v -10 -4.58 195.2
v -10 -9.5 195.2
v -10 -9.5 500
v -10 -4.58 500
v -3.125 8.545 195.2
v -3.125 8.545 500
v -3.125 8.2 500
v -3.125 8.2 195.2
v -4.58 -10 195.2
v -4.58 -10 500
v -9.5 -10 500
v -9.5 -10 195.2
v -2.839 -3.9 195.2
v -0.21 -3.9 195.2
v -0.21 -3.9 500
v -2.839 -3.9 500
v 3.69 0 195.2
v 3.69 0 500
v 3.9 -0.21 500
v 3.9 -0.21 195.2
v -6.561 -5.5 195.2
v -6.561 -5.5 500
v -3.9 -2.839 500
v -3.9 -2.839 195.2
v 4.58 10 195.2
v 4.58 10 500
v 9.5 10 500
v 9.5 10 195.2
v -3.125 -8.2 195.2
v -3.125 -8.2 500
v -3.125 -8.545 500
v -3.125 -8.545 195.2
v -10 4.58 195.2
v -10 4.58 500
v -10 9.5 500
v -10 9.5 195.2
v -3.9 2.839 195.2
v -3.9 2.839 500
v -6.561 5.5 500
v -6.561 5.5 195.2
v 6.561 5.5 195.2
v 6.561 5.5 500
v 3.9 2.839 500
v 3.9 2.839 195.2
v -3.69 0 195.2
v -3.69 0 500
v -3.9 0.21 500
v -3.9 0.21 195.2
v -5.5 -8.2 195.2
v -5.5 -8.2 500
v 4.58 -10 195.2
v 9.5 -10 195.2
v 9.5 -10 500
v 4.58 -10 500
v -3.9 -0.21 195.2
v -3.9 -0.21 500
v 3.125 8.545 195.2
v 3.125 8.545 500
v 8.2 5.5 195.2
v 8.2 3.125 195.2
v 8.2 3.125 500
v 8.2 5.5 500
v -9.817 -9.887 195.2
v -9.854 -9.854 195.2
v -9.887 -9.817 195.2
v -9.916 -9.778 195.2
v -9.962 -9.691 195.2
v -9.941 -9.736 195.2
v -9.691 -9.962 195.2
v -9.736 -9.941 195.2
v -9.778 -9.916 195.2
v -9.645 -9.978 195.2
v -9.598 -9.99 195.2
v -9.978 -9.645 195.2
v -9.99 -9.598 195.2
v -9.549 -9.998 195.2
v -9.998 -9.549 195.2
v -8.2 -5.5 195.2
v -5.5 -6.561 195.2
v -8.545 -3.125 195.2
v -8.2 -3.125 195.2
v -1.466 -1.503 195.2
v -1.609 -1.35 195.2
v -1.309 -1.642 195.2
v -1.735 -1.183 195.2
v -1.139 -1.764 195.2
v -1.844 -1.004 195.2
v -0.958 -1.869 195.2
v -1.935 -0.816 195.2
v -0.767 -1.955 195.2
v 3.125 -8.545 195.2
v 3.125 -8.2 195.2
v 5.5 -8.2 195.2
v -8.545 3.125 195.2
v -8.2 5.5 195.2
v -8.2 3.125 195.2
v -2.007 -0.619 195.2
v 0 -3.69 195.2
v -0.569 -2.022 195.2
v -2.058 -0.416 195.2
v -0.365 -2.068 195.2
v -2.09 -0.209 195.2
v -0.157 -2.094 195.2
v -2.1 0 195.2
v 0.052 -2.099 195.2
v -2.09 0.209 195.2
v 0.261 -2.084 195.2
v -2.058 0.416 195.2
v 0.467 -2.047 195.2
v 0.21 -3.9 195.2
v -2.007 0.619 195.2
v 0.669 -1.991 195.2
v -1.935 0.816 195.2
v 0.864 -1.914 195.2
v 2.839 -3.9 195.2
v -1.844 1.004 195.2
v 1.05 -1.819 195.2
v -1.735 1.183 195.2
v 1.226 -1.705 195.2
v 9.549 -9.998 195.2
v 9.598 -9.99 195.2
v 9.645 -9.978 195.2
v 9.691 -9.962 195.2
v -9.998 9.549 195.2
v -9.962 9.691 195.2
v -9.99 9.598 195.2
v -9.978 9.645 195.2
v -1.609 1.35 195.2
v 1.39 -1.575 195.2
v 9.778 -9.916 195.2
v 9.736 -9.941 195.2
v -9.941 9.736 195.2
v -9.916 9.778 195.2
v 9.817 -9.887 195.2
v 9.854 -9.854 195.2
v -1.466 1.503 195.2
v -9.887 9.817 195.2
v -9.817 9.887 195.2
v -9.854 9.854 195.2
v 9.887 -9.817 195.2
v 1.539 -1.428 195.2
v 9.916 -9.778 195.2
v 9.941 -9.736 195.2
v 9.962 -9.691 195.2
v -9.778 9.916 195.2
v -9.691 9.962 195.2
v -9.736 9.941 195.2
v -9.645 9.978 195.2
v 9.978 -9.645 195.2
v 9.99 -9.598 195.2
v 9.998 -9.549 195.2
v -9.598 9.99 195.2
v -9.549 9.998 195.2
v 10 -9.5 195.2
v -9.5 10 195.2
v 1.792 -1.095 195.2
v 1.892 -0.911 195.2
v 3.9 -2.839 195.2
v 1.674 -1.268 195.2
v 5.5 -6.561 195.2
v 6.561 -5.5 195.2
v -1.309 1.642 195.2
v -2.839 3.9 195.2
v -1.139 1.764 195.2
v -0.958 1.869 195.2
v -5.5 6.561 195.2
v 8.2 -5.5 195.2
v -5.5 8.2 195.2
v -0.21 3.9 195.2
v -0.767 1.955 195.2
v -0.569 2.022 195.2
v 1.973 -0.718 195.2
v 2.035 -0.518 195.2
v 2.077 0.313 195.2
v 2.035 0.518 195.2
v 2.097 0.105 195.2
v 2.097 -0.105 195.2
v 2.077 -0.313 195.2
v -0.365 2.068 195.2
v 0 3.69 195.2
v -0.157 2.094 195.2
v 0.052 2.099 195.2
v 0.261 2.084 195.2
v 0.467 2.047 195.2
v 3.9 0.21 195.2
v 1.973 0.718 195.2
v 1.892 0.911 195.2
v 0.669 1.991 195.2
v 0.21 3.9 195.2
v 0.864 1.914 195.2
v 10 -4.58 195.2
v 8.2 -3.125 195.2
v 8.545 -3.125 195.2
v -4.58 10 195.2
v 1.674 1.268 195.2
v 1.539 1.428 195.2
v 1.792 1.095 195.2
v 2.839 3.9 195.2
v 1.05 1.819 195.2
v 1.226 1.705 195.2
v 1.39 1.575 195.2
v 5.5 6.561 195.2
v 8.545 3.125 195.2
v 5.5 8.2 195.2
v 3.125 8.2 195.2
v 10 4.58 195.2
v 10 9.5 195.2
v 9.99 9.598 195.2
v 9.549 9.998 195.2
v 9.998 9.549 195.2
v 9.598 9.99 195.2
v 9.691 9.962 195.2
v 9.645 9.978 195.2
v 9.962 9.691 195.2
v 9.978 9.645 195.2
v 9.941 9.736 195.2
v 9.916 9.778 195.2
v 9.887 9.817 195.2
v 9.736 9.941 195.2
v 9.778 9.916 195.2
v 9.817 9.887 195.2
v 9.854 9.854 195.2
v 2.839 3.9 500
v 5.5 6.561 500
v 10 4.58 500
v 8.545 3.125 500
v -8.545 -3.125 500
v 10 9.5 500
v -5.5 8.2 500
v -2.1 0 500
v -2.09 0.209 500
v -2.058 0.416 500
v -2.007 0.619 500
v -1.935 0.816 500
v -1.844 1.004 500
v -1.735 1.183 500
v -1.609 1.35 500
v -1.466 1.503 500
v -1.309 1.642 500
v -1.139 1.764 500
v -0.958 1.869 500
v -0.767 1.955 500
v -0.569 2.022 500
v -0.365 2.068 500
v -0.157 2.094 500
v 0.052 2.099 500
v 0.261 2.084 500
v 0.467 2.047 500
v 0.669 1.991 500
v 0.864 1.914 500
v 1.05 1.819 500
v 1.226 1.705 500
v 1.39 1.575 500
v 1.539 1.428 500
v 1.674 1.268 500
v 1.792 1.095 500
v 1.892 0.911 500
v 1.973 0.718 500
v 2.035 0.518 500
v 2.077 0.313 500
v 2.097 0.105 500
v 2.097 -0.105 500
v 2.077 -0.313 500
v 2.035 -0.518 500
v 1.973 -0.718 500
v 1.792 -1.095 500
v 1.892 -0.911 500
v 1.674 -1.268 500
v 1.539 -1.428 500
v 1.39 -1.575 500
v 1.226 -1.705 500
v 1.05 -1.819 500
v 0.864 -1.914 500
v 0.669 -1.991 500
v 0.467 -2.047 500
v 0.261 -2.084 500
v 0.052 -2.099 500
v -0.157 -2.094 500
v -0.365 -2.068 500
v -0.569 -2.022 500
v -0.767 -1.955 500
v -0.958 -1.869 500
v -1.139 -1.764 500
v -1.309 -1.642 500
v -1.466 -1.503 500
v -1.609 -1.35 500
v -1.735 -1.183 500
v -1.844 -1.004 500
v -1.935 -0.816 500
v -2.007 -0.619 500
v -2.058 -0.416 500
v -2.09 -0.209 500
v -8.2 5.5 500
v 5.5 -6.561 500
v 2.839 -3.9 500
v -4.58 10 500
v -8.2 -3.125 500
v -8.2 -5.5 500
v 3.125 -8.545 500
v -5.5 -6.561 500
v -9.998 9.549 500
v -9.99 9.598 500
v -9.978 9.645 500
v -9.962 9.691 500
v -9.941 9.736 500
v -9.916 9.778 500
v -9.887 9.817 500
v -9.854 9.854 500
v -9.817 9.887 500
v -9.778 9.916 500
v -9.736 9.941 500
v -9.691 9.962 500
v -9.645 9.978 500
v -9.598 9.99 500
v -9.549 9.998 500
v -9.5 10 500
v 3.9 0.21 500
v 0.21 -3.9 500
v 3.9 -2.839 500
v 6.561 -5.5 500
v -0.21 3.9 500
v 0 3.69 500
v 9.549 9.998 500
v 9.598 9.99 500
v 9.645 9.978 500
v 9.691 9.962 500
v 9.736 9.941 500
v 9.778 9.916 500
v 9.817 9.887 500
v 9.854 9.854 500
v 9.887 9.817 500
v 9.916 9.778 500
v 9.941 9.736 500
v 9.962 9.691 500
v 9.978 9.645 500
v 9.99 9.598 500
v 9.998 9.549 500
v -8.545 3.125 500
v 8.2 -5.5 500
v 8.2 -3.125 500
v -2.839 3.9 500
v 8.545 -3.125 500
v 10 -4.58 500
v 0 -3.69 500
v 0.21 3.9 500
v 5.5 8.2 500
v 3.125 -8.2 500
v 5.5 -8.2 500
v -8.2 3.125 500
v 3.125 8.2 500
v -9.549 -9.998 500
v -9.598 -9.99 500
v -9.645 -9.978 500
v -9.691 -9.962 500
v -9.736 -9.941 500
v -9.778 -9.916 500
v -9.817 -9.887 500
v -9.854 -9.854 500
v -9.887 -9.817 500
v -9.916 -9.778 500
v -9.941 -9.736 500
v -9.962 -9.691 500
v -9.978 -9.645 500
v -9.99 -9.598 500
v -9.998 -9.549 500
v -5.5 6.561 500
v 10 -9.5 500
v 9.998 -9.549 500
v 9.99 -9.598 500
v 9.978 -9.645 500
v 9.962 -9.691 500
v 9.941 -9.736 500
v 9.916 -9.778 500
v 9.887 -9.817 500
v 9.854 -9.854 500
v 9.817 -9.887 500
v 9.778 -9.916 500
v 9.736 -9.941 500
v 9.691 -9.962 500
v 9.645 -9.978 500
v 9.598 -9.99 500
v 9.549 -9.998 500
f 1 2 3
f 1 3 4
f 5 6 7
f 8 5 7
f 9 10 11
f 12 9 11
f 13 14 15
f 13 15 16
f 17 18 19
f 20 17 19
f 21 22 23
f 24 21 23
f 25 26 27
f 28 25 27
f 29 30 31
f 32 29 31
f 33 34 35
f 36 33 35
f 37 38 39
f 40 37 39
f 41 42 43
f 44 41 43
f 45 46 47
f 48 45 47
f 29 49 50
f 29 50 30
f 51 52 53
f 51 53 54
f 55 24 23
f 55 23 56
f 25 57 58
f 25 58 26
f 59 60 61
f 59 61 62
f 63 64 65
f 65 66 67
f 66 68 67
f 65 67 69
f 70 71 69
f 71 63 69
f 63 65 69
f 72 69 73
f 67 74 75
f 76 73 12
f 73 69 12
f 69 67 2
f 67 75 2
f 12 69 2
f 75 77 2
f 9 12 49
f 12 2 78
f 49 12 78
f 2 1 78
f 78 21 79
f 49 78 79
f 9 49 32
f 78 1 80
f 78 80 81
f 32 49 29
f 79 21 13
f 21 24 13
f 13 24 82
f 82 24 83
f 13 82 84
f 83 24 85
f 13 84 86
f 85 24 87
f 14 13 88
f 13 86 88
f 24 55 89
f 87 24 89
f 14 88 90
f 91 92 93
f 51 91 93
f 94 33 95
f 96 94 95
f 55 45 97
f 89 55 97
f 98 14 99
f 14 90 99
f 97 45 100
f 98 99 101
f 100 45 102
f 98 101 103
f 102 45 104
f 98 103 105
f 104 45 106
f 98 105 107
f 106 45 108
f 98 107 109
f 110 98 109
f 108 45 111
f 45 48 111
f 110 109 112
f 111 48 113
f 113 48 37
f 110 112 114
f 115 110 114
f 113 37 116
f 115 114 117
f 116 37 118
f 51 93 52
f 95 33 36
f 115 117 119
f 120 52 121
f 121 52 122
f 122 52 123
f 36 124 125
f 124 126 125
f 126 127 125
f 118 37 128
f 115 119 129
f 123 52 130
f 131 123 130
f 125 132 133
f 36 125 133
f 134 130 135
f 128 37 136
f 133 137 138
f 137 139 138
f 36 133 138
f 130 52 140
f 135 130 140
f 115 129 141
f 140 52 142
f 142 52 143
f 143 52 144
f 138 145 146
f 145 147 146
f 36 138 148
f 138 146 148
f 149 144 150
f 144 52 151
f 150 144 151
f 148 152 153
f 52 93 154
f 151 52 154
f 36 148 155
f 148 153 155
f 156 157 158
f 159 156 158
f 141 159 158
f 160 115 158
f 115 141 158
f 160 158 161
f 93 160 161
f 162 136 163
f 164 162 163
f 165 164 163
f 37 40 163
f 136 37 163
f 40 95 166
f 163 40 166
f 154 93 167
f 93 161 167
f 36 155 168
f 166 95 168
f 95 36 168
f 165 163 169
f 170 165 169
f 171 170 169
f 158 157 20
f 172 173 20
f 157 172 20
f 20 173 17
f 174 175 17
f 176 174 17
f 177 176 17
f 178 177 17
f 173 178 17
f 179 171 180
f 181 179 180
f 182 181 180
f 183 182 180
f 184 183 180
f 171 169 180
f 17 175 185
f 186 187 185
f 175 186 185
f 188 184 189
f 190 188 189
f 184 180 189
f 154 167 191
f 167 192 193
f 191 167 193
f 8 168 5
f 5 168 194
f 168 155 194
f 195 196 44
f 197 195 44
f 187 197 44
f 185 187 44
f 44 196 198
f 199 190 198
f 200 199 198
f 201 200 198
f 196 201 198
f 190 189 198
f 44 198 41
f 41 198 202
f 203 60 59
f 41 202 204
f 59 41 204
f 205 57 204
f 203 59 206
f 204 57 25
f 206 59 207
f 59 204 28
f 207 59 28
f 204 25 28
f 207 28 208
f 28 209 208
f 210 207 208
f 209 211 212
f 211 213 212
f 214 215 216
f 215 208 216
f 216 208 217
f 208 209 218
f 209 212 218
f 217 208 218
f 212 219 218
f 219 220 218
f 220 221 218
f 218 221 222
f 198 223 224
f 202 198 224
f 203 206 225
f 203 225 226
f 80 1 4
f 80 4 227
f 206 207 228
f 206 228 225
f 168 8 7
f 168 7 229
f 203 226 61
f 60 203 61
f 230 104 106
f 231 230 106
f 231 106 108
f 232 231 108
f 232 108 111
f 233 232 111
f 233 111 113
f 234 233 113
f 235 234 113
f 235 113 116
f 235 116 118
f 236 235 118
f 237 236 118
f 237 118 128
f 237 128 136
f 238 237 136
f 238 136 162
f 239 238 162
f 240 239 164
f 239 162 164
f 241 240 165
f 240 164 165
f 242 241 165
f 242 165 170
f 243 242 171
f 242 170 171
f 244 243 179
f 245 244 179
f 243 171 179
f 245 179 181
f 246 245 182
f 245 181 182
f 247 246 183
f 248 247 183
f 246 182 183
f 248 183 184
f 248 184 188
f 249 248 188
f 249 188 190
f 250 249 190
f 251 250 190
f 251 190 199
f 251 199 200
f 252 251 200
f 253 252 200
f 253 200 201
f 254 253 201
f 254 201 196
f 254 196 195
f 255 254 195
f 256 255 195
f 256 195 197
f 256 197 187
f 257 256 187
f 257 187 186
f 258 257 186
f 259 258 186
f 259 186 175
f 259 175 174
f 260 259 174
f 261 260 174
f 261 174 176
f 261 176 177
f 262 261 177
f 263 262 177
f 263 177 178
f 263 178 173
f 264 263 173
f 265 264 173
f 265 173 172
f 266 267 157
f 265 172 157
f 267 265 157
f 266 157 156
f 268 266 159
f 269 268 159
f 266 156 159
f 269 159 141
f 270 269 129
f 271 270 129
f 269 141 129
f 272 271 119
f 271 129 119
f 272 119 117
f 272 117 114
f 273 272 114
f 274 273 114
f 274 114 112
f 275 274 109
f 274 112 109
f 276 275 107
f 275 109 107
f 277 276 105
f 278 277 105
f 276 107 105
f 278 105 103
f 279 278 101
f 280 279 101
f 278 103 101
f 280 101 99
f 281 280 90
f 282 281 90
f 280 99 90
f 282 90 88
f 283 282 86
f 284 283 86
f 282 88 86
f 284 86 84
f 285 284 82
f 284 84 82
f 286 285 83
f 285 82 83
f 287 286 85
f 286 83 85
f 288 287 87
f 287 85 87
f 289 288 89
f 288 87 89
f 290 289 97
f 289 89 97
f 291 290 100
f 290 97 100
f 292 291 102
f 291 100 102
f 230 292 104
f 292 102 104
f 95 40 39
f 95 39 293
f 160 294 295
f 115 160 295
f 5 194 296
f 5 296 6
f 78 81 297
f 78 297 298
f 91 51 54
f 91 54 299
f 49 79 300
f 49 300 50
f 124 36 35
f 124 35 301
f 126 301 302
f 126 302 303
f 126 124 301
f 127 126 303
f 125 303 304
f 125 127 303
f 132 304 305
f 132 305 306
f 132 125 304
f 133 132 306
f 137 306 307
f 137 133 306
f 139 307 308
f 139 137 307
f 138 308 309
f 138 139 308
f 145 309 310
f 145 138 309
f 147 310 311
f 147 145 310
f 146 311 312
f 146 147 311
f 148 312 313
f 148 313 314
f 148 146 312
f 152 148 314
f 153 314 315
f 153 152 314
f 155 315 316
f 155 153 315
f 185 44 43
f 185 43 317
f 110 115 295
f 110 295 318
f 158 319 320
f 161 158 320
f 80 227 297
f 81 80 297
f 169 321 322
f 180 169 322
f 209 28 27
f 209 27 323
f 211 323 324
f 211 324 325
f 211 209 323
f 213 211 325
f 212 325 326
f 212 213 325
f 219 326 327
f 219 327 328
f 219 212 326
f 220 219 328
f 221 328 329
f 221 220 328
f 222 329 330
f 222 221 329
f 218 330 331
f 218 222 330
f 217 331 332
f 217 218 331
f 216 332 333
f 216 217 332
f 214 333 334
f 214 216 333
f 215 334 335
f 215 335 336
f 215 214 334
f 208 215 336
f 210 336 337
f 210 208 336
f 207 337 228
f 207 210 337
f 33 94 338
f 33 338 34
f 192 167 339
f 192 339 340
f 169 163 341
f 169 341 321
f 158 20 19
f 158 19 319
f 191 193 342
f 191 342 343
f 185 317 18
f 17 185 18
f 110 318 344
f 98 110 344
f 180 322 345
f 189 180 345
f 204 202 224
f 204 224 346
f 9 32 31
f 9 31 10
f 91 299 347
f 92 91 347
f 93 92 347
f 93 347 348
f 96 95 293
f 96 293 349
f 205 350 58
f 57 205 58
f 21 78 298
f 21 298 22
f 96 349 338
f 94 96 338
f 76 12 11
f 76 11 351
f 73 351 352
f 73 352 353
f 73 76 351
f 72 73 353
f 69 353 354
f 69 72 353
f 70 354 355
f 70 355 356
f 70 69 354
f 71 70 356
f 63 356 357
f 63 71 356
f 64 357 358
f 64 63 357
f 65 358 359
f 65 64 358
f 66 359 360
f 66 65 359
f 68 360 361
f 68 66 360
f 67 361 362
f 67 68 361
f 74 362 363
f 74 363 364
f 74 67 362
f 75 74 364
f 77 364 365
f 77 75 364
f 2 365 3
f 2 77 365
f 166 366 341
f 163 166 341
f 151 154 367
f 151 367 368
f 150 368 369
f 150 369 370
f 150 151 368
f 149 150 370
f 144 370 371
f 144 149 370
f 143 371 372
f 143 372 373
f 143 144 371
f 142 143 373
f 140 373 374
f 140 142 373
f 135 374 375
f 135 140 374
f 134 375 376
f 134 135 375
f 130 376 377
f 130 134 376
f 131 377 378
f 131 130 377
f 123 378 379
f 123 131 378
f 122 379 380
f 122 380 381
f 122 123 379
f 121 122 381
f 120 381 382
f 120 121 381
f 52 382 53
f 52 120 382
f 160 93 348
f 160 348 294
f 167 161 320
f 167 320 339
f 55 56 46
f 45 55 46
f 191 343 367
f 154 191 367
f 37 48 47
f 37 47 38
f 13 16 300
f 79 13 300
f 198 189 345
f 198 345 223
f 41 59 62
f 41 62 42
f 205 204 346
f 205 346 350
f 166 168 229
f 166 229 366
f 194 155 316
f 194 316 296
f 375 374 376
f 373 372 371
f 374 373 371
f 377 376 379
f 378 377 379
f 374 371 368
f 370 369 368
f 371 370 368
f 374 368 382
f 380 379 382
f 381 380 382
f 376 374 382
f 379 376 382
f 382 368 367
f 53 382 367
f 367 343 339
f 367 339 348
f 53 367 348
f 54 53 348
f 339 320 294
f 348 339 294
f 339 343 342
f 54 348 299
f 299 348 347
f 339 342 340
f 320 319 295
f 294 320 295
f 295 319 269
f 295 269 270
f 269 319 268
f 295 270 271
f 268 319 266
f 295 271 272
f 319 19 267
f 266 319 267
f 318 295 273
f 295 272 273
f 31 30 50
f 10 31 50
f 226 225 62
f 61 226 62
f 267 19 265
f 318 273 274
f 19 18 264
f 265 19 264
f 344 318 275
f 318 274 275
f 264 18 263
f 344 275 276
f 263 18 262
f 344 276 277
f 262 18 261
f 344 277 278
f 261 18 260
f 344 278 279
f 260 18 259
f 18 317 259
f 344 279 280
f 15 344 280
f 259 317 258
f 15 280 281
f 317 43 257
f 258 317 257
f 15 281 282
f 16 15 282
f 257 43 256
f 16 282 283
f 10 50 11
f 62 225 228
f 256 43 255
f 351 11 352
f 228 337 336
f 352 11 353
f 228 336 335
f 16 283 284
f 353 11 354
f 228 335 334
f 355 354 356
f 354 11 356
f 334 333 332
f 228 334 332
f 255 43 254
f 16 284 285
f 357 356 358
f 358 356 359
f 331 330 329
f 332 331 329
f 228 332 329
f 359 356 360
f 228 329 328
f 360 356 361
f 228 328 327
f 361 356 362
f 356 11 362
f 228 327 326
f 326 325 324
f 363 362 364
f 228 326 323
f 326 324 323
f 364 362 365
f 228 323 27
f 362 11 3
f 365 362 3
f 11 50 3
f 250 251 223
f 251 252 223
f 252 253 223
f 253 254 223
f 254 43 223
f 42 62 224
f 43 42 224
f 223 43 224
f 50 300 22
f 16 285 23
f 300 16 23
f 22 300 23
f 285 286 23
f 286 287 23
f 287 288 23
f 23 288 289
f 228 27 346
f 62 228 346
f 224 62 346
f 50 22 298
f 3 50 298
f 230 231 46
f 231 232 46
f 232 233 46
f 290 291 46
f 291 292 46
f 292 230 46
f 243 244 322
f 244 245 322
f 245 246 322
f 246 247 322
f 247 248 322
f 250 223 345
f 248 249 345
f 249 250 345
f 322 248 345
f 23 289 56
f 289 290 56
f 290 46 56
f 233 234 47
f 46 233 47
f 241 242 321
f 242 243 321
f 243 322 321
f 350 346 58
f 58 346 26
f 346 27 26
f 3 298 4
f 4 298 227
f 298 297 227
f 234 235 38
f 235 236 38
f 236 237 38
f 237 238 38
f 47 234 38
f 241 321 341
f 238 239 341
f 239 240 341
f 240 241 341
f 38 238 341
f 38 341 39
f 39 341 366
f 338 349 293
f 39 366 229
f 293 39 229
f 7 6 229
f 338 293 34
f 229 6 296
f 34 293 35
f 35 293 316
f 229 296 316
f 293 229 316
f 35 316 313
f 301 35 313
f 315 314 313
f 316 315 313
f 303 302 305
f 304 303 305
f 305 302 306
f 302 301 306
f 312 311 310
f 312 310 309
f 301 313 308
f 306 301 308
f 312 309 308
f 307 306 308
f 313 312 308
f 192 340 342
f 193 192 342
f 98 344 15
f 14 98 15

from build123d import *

# Parameters (mm, degrees)
SKETCH1_R           = 2.1
BOSS_EXTRUDE1_DEPTH = 500


with BuildPart() as part:
    # Sketch1 → Boss-Extrude1 (new body)
    with BuildSketch(Plane(origin=(0, 0, 0), x_dir=(-1, 0, 0), z_dir=(0, 0, -1))):
        with BuildLine():
            Line((-3.9, -0.21), (-3.9, -2.839339828))
            Line((-3.9, -2.839339828), (-6.560660172, -5.5))
            Line((-6.560660172, -5.5), (-8.2, -5.5))
            Line((-8.2, -5.5), (-8.2, -3.125))
            Line((-8.2, -3.125), (-8.545, -3.125))
            Line((-8.545, -3.125), (-10, -4.58))
            Line((-10, -4.58), (-10, -9.5))
            ThreePointArc((-10, -9.5), (-9.853553391, -9.853553391), (-9.5, -10))
            Line((-9.5, -10), (-4.58, -10))
            Line((-4.58, -10), (-3.125, -8.545))
            Line((-3.125, -8.545), (-3.125, -8.2))
            Line((-3.125, -8.2), (-5.5, -8.2))
            Line((-5.5, -8.2), (-5.5, -6.560660172))
            Line((-5.5, -6.560660172), (-2.839339828, -3.9))
            Line((-2.839339828, -3.9), (-0.21, -3.9))
            Line((-0.21, -3.9), (0, -3.69))
            Line((0, -3.69), (0.21, -3.9))
            Line((0.21, -3.9), (2.839339828, -3.9))
            Line((2.839339828, -3.9), (5.5, -6.560660172))
            Line((5.5, -6.560660172), (5.5, -8.2))
            Line((5.5, -8.2), (3.125, -8.2))
            Line((3.125, -8.2), (3.125, -8.545))
            Line((3.125, -8.545), (4.58, -10))
            Line((4.58, -10), (9.5, -10))
            ThreePointArc((9.5, -10), (9.853553391, -9.853553391), (10, -9.5))
            Line((10, -9.5), (10, -4.58))
            Line((10, -4.58), (8.545, -3.125))
            Line((8.545, -3.125), (8.2, -3.125))
            Line((8.2, -3.125), (8.2, -5.5))
            Line((8.2, -5.5), (6.560660172, -5.5))
            Line((6.560660172, -5.5), (3.9, -2.839339828))
            Line((3.9, -2.839339828), (3.9, -0.21))
            Line((3.9, -0.21), (3.69, 0))
            Line((3.69, 0), (3.9, 0.21))
            Line((3.9, 0.21), (3.9, 2.839339828))
            Line((3.9, 2.839339828), (6.560660172, 5.5))
            Line((6.560660172, 5.5), (8.2, 5.5))
            Line((8.2, 5.5), (8.2, 3.125))
            Line((8.2, 3.125), (8.545, 3.125))
            Line((8.545, 3.125), (10, 4.58))
            Line((10, 4.58), (10, 9.5))
            ThreePointArc((10, 9.5), (9.853553391, 9.853553391), (9.5, 10))
            Line((9.5, 10), (4.58, 10))
            Line((4.58, 10), (3.125, 8.545))
            Line((3.125, 8.545), (3.125, 8.2))
            Line((3.125, 8.2), (5.5, 8.2))
            Line((5.5, 8.2), (5.5, 6.560660172))
            Line((5.5, 6.560660172), (2.839339828, 3.9))
            Line((2.839339828, 3.9), (0.21, 3.9))
            Line((0.21, 3.9), (0, 3.69))
            Line((0, 3.69), (-0.21, 3.9))
            Line((-0.21, 3.9), (-2.839339828, 3.9))
            Line((-2.839339828, 3.9), (-5.5, 6.560660172))
            Line((-5.5, 6.560660172), (-5.5, 8.2))
            Line((-5.5, 8.2), (-3.125, 8.2))
            Line((-3.125, 8.2), (-3.125, 8.545))
            Line((-3.125, 8.545), (-4.58, 10))
            Line((-4.58, 10), (-9.5, 10))
            ThreePointArc((-9.5, 10), (-9.853553391, 9.853553391), (-10, 9.5))
            Line((-10, 9.5), (-10, 4.58))
            Line((-10, 4.58), (-8.545, 3.125))
            Line((-8.545, 3.125), (-8.2, 3.125))
            Line((-8.2, 3.125), (-8.2, 5.5))
            Line((-8.2, 5.5), (-6.560660172, 5.5))
            Line((-6.560660172, 5.5), (-3.9, 2.839339828))
            Line((-3.9, 2.839339828), (-3.9, 0.21))
            Line((-3.9, 0.21), (-3.69, 0))
            Line((-3.69, 0), (-3.9, -0.21))
        make_face()
        Circle(SKETCH1_R, mode=Mode.SUBTRACT)
    extrude(amount=-BOSS_EXTRUDE1_DEPTH)

    # Split1
    split(bisect_by=Plane.XY.offset(195.2), keep=Keep.TOP)


solid = part.part
